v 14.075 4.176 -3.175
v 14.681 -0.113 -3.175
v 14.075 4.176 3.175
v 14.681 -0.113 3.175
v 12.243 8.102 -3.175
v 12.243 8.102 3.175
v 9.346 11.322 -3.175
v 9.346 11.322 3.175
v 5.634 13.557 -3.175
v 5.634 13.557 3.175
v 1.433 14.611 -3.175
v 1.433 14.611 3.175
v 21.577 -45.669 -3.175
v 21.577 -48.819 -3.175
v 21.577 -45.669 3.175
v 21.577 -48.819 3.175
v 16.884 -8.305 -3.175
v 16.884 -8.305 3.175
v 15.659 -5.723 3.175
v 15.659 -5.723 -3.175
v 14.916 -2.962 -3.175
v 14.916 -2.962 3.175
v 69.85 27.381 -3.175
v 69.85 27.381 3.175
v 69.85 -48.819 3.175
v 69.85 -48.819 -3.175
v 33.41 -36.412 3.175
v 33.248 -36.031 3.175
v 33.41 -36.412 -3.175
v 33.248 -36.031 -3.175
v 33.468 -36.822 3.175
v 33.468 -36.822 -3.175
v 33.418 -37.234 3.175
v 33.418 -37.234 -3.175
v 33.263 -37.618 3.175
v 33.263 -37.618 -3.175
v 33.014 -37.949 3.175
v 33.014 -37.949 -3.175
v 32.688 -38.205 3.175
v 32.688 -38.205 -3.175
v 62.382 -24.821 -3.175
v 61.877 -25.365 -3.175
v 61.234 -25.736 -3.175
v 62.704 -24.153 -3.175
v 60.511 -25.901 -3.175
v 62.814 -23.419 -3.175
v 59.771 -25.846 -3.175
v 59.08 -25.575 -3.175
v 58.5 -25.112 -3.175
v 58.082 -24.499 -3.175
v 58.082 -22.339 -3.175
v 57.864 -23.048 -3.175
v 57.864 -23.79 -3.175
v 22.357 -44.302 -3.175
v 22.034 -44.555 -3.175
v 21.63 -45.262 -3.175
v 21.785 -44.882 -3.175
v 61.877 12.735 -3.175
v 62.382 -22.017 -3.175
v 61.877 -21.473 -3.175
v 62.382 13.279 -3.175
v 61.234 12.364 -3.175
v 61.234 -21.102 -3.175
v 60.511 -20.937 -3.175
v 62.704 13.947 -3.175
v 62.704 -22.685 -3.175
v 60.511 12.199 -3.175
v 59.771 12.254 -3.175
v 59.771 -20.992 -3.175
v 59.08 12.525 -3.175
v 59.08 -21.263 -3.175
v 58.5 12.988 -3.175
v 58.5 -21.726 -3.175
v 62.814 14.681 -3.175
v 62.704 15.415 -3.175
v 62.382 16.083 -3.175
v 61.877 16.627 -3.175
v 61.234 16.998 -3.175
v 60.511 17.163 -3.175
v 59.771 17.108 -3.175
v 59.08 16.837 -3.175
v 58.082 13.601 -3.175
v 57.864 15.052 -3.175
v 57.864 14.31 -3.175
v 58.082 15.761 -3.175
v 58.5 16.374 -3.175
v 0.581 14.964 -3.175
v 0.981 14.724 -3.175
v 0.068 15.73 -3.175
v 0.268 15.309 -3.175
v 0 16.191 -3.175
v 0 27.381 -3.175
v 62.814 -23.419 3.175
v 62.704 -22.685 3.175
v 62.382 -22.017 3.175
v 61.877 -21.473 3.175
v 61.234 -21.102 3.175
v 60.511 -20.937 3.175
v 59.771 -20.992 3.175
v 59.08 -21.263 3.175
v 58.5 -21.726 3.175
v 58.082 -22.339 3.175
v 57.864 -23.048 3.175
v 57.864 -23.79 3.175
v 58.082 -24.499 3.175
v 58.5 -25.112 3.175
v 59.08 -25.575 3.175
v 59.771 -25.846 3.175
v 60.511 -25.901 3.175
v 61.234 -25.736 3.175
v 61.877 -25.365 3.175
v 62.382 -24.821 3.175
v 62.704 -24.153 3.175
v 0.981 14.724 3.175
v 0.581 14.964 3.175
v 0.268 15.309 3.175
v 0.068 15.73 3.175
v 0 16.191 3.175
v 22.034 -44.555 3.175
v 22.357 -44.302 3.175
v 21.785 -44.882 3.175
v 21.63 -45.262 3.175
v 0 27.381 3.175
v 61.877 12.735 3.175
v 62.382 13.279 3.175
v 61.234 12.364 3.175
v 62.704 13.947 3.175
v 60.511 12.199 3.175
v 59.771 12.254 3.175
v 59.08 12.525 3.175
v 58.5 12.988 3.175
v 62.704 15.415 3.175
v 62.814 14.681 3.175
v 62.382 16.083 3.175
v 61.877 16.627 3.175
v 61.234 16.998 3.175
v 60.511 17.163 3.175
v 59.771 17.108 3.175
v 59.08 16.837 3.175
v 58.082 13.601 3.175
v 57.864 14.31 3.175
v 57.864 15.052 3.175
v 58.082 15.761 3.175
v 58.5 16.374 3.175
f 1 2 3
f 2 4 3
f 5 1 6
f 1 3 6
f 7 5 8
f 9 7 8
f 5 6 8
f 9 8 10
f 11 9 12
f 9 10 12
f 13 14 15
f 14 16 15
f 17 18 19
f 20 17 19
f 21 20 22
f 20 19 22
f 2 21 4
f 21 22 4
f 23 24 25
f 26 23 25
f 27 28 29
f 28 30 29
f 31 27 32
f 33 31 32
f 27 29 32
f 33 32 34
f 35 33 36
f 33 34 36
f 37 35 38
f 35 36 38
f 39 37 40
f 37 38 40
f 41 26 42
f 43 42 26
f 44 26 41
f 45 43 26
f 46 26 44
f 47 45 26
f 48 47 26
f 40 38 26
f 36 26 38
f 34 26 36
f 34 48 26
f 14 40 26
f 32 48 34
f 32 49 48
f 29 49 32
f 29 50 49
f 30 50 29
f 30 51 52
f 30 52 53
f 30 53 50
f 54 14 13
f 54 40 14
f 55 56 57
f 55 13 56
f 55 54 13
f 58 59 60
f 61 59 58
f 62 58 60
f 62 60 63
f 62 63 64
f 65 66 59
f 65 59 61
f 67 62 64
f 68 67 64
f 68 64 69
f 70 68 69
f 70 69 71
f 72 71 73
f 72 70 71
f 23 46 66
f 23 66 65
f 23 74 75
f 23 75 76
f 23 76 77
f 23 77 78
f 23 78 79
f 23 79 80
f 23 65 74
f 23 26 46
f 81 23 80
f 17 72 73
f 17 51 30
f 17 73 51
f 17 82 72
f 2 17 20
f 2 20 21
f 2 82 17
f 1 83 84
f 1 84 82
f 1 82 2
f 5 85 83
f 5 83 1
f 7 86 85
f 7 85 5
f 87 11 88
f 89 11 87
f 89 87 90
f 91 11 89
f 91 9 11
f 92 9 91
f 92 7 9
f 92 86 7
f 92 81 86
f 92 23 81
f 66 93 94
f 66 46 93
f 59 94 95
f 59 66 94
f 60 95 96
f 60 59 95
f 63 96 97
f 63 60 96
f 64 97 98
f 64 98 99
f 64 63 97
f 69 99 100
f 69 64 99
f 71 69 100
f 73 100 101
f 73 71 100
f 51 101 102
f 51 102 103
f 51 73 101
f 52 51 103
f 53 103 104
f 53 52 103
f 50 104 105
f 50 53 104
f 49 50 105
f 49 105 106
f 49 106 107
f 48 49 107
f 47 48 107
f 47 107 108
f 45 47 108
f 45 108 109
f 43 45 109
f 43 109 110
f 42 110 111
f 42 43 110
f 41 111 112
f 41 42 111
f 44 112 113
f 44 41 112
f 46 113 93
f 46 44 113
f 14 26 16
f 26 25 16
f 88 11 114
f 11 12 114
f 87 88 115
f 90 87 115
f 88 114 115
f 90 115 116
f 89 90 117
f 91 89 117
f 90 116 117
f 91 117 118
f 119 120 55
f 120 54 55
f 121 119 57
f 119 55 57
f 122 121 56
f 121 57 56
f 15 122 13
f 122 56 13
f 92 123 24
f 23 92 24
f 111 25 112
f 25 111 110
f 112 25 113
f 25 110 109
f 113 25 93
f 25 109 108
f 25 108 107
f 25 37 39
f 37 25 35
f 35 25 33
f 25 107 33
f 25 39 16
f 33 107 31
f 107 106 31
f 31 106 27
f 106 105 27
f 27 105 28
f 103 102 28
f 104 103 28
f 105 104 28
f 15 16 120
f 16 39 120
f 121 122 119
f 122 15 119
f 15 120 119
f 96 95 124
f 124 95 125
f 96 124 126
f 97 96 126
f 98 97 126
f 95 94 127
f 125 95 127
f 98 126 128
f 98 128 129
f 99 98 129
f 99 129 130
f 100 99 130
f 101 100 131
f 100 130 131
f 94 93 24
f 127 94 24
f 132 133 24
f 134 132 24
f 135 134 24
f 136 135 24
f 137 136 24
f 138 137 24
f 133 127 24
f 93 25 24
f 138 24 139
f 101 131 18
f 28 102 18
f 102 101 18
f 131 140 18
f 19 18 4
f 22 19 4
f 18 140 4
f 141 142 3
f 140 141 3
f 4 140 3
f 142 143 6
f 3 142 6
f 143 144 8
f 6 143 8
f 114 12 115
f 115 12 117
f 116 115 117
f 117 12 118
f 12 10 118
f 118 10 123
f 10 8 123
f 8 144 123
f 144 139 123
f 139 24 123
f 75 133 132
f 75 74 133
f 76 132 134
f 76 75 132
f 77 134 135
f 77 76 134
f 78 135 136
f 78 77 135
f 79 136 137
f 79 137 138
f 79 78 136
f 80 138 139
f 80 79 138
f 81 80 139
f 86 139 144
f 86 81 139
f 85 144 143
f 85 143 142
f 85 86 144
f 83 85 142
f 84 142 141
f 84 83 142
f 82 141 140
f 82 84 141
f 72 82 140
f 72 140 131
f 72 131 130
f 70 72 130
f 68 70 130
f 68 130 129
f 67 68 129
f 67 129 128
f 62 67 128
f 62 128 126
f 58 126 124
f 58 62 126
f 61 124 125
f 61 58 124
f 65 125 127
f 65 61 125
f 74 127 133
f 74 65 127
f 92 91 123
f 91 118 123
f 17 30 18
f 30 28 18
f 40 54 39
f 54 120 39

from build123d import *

# Parameters (mm, degrees)
SKETCH1_R           = 2.4892
BOSS_EXTRUDE1_DEPTH = 3.175
FILLET1_R           = 1.5875


with BuildPart() as part:
    # Sketch1 → Boss-Extrude1 (new, symmetric)
    with BuildSketch(Plane.XY):
        with BuildLine():
            Line((69.85, 27.3812), (69.85, -48.8188))
            Line((69.85, -48.8188), (21.576606, -48.8188))
            Line((21.576606, -48.8188), (21.576606, -44.762860113))
            Line((21.576606, -44.762860113), (34.055016522, -37.397839205))
            Line((34.055016522, -37.397839205), (16.883960941, -8.3052564))
            ThreePointArc((16.883960941, -8.3052564), (15.225065006, -4.359245427), (14.68076155, -0.11346257))
            ThreePointArc((14.68076155, -0.11346257), (10.421213944, 10.340983192), (0, 14.6812))
            Line((0, 14.6812), (0, 27.3812))
            Line((0, 27.3812), (69.85, 27.3812))
        make_face()
        with Locations((60.325, 14.6812)):
            Circle(SKETCH1_R, mode=Mode.SUBTRACT)
        with Locations((60.325, -23.4188)):
            Circle(SKETCH1_R, mode=Mode.SUBTRACT)
    extrude(amount=BOSS_EXTRUDE1_DEPTH, both=True)

    # Fillet1
    fillet1_edges = [part.edges().sort_by_distance(p)[0] for p in [
        (21.576606, -44.762860113, 0),
        (34.055016522, -37.397839205, 0),
        (0, 14.6812, 0),
    ]]
    fillet(fillet1_edges, radius=FILLET1_R)


solid = part.part
